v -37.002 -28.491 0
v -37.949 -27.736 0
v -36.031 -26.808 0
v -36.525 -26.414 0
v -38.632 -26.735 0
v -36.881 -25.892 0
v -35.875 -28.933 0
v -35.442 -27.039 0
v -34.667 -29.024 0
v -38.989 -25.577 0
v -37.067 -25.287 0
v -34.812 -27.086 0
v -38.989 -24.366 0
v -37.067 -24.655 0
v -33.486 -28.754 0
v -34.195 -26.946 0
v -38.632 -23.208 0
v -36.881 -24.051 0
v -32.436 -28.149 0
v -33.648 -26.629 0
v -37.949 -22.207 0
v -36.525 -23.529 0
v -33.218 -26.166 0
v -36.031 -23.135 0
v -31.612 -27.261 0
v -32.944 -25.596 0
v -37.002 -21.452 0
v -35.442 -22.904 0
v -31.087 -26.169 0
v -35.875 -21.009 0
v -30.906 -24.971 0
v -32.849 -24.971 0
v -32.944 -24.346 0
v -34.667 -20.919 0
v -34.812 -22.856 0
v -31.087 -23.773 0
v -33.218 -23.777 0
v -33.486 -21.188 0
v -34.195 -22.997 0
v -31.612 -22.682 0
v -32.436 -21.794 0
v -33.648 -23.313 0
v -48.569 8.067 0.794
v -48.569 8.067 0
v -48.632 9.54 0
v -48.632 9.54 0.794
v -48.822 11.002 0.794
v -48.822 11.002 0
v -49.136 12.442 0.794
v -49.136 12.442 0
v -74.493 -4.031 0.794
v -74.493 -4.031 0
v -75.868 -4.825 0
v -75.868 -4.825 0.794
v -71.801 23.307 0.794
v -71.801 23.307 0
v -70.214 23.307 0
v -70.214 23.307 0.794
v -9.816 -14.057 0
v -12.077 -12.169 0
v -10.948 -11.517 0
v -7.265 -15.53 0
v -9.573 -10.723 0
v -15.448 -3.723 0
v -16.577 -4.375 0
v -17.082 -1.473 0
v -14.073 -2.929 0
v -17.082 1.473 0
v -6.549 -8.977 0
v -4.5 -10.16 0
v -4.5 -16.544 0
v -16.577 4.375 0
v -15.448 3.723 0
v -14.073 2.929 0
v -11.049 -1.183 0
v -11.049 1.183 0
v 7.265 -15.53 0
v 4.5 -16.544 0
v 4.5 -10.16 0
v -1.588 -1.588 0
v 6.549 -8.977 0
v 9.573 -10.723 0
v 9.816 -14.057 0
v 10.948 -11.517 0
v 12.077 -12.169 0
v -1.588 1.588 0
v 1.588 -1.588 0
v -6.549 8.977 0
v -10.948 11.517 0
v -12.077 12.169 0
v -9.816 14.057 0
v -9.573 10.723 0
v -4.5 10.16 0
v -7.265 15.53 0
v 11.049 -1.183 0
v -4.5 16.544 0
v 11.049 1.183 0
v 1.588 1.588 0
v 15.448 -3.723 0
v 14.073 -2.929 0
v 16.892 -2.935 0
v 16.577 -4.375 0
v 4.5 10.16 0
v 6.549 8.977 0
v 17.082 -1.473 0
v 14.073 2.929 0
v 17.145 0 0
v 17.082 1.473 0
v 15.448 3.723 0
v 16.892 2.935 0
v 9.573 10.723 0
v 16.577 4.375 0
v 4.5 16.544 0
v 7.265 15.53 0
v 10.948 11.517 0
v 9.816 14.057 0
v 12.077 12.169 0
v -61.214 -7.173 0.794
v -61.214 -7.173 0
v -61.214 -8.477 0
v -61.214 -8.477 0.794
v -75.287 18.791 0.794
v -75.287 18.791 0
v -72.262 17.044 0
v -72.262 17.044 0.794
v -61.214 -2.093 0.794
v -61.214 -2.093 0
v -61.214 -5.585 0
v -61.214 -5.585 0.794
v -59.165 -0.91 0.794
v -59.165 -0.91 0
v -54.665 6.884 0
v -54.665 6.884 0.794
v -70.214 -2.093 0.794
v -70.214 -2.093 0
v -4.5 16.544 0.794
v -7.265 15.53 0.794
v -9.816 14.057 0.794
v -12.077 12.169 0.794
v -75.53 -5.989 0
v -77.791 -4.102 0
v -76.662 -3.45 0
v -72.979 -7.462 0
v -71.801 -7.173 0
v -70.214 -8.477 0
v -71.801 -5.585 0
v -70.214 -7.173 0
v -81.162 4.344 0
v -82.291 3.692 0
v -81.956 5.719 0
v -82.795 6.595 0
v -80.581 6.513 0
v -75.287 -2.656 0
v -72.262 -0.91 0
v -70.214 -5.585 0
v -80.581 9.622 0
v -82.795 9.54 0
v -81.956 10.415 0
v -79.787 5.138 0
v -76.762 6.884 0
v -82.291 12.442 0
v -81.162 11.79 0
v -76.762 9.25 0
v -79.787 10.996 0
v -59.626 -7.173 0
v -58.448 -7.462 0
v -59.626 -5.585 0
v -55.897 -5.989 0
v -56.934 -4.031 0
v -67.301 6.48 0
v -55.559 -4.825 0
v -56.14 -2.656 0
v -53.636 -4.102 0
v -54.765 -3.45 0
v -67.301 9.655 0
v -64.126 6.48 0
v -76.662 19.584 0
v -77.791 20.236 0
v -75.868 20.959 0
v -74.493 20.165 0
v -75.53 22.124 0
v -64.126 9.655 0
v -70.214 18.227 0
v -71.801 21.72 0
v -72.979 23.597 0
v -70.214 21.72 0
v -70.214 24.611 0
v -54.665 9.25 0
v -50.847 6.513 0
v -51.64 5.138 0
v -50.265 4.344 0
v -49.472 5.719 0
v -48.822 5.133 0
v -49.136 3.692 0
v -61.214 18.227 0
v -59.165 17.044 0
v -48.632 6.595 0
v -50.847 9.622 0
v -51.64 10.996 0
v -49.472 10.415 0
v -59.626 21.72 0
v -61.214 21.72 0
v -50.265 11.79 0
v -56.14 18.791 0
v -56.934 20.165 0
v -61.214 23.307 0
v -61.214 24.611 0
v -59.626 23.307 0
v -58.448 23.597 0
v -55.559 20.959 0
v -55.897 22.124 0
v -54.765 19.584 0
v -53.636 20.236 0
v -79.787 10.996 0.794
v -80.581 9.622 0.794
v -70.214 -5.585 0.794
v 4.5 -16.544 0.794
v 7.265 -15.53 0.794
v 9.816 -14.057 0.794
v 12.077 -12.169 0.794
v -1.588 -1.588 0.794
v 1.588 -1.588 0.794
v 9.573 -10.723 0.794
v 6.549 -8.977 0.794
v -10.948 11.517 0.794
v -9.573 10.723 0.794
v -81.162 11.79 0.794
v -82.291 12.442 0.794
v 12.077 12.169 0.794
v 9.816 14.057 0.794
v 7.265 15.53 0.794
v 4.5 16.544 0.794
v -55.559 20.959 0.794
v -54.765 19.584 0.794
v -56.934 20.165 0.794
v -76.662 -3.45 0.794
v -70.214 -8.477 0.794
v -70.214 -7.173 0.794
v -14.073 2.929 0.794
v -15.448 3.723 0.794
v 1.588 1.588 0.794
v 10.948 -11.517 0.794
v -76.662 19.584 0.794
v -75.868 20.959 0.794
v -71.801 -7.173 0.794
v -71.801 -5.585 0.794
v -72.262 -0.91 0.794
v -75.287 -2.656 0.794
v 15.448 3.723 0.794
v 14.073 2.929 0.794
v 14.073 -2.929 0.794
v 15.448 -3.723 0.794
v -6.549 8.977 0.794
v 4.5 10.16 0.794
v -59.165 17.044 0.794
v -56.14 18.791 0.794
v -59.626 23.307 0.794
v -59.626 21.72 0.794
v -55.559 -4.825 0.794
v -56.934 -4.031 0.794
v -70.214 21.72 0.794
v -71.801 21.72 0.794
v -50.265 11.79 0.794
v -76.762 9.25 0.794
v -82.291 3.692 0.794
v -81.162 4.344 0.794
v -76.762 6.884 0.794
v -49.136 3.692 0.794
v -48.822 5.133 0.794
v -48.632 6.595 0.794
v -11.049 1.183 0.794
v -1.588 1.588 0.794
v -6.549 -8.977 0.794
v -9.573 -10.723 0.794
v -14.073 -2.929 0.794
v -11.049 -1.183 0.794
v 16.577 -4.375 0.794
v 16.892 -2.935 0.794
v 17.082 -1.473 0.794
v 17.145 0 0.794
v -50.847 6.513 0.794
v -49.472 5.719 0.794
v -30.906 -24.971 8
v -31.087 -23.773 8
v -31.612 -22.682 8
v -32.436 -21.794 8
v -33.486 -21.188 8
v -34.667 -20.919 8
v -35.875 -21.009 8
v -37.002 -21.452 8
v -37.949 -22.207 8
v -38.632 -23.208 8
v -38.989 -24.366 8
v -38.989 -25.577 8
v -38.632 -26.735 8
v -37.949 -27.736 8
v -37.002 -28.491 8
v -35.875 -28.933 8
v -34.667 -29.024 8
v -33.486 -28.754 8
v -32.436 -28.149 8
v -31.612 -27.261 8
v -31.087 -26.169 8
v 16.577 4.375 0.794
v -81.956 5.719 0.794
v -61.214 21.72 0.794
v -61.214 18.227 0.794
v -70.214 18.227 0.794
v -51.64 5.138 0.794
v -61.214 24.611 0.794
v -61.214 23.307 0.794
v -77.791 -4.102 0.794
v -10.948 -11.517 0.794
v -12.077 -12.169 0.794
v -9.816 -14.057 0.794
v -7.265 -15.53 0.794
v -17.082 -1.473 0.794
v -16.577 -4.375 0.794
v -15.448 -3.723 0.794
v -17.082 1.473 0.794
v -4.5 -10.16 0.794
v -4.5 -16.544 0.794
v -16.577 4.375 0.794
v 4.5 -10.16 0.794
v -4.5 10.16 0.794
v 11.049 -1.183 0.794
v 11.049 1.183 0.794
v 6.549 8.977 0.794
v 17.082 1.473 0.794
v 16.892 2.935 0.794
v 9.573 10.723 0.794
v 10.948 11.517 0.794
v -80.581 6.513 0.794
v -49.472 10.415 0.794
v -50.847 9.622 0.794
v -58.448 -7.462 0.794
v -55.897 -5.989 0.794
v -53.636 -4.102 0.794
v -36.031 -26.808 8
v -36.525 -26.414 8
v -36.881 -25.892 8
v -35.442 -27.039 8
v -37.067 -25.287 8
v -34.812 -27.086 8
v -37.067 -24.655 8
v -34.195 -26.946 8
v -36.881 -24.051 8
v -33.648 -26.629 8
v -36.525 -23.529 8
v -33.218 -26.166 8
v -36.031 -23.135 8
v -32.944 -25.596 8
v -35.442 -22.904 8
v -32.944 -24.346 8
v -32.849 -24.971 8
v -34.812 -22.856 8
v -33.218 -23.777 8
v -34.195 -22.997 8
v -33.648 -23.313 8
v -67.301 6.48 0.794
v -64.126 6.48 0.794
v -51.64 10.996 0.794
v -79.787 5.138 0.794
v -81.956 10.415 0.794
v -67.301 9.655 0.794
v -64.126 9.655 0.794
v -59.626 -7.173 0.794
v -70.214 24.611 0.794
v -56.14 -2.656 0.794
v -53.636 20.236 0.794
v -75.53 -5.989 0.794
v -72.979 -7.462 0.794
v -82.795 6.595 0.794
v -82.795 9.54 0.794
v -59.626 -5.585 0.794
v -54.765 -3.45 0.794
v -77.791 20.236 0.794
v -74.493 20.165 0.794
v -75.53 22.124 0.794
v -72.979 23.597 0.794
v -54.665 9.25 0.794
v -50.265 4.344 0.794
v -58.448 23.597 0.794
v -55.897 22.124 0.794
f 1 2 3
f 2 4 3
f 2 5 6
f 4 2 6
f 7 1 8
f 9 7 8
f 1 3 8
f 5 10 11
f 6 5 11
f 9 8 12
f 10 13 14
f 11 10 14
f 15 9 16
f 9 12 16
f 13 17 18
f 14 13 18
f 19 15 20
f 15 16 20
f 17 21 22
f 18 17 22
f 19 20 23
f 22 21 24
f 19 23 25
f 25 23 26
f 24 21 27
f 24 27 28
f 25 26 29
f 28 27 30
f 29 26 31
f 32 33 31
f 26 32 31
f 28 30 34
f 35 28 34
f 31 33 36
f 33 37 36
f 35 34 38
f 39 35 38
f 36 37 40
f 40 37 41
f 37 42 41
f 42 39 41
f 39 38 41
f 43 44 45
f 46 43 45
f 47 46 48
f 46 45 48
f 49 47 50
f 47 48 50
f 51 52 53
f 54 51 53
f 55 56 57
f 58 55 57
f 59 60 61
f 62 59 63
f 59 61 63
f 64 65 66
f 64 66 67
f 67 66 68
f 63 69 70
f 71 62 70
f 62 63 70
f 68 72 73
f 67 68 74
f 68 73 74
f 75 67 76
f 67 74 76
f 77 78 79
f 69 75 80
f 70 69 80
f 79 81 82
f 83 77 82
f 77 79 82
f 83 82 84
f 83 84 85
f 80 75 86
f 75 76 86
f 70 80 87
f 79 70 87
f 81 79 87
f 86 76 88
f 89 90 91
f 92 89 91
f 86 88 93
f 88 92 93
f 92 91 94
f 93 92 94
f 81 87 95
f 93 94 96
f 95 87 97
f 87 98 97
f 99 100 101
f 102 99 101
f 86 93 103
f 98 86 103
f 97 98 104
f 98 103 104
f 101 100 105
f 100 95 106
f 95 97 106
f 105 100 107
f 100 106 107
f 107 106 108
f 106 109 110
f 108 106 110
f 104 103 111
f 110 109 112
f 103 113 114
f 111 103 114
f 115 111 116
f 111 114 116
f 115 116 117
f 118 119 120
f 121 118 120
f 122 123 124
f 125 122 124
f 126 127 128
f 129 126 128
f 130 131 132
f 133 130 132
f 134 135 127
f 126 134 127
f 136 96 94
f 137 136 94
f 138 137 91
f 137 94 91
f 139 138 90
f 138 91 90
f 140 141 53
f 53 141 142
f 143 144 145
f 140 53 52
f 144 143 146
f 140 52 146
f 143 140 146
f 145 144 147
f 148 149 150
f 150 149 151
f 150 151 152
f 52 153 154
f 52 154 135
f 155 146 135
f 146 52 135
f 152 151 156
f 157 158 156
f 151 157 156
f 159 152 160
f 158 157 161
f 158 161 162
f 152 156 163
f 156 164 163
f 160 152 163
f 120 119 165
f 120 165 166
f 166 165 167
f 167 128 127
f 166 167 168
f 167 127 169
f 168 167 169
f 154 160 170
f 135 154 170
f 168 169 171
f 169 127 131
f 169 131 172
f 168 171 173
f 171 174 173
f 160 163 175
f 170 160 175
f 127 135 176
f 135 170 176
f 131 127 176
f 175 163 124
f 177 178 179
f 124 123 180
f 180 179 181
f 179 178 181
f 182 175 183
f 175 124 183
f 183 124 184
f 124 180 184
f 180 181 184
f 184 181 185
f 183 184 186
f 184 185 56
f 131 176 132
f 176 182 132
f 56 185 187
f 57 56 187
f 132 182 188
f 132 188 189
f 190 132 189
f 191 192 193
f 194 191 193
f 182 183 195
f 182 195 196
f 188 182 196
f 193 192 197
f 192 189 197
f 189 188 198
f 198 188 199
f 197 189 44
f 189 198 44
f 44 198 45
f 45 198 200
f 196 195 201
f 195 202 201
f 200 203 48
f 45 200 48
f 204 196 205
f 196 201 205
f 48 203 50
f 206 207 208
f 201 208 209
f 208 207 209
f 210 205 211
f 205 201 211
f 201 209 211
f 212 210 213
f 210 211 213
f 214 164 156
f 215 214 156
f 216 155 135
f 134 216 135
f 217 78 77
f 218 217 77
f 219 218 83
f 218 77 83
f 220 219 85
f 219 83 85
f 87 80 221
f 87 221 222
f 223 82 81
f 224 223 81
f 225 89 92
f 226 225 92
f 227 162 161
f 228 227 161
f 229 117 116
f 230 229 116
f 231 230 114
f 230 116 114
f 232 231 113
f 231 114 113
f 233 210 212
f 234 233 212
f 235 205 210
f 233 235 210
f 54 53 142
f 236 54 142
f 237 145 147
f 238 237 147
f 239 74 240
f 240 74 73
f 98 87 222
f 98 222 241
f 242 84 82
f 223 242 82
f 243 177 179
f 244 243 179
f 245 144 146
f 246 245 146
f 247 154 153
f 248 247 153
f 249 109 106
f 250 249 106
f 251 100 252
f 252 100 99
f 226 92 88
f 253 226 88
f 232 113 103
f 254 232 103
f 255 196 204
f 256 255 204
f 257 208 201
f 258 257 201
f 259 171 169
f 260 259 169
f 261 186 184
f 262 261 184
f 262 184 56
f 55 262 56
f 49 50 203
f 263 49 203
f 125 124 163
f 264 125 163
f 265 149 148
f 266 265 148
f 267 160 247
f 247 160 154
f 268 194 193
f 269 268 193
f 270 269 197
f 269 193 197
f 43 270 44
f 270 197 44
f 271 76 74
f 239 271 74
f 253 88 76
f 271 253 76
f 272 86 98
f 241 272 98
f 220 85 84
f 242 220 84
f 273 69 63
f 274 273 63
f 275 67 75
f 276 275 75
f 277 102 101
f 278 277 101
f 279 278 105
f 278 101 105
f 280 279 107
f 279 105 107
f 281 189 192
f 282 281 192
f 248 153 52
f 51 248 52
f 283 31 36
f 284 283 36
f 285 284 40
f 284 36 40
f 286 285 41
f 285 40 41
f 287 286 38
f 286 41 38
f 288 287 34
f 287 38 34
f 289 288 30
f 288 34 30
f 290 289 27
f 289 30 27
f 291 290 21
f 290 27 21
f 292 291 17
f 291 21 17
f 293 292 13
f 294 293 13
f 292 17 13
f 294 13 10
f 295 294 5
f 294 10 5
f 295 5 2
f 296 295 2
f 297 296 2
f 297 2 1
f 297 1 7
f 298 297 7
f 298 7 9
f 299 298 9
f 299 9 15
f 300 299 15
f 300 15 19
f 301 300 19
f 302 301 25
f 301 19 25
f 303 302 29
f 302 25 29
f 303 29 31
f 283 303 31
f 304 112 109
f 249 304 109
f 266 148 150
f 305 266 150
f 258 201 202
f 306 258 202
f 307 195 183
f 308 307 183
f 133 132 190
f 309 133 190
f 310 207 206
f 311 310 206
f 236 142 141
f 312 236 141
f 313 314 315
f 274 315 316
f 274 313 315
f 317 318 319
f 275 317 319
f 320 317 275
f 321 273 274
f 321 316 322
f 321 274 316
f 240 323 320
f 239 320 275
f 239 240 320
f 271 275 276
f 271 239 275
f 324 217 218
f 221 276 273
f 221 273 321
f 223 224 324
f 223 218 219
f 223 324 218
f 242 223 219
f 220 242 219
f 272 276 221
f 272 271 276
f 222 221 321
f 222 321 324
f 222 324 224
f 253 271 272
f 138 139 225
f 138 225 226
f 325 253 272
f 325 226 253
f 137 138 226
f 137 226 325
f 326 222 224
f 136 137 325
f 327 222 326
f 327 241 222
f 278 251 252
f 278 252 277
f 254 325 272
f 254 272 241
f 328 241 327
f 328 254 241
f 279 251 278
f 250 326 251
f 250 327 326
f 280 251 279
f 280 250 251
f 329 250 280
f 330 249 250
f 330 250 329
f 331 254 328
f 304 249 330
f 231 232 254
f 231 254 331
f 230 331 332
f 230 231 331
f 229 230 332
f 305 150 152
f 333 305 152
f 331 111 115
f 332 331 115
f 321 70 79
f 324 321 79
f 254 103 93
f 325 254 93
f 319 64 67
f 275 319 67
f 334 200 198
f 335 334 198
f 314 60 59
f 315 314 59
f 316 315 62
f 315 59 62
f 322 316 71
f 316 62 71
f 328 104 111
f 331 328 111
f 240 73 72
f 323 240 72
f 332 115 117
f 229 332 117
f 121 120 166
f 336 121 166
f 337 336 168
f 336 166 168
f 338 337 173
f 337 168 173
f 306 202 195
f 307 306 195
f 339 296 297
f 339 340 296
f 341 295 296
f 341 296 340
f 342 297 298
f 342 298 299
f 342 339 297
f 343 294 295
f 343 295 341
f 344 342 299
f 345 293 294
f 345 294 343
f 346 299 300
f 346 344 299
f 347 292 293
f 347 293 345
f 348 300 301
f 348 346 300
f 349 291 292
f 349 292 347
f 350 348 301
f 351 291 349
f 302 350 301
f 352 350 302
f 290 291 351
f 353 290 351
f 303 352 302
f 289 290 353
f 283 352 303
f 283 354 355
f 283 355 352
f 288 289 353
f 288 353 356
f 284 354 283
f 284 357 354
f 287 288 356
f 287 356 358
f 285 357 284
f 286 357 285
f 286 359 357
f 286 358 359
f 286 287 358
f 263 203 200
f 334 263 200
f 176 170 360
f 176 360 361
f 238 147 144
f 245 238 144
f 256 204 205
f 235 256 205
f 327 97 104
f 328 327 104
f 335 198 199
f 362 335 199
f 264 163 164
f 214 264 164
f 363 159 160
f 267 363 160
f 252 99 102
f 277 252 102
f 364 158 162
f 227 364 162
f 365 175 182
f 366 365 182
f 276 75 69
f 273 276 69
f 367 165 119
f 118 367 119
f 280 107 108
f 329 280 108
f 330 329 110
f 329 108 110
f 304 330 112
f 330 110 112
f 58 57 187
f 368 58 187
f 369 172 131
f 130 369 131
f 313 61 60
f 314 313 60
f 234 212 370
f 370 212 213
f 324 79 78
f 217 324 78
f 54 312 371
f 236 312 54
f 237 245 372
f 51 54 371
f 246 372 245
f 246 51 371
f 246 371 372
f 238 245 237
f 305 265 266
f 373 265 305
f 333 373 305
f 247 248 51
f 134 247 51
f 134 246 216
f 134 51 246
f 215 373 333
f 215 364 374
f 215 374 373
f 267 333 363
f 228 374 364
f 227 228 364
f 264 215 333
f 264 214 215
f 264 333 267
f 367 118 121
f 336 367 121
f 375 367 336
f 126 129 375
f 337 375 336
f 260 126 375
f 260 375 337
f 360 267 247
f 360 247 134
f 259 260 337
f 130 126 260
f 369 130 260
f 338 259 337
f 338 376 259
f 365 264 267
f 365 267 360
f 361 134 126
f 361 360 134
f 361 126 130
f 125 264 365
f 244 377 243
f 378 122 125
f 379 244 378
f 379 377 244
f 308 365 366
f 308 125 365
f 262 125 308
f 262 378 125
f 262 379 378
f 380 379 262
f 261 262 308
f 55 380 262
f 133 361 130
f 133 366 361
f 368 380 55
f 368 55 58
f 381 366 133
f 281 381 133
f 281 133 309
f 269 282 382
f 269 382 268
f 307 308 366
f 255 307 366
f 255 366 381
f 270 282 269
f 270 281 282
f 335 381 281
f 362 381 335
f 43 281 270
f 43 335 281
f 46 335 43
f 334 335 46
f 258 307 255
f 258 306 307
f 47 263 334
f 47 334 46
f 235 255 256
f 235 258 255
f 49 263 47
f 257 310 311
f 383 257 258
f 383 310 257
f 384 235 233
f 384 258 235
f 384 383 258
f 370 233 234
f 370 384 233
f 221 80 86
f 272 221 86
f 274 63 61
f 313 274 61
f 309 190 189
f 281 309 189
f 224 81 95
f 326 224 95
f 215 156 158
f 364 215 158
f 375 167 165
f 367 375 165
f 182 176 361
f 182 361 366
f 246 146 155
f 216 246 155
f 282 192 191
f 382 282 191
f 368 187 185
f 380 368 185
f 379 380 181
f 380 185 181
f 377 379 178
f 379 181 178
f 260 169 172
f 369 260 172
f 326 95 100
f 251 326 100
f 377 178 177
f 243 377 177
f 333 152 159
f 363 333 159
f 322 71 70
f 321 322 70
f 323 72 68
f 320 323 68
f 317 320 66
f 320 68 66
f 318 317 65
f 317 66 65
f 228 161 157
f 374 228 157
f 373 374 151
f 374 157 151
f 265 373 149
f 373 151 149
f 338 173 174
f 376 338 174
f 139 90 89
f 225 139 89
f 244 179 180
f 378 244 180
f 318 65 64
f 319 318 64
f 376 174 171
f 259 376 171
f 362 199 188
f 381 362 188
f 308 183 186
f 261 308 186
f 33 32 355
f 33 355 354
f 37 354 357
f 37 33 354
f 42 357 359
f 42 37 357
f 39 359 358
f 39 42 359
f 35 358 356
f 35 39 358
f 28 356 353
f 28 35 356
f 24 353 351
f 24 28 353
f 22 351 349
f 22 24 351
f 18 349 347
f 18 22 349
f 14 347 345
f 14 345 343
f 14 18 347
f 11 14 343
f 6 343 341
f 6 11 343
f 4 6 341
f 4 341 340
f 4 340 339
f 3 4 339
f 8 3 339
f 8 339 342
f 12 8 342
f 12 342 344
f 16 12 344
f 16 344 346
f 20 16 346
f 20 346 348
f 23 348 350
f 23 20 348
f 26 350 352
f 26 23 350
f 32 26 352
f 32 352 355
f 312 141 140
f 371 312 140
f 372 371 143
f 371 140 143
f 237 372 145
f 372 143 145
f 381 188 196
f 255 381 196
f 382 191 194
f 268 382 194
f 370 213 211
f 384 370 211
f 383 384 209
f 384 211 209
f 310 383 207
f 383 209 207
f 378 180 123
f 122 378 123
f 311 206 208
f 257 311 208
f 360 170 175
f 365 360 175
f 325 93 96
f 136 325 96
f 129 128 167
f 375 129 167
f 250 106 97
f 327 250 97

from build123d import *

# Parameters (mm, degrees)
F0_R     = 4.064
F0_R_2   = 2.1209
F1_DEPTH = 8
F0_W     = 1.5875
F0_H     = 1.5875
F0_W_2   = 3.175
F0_H_2   = 3.175
F2_DEPTH = 0.79375
F3_DEPTH = 0.79375


with BuildPart() as f1:
    # F0 (on Top) → F1 (new body)
    with BuildSketch(Plane.XY):
        with Locations((-34.970284, -24.971306)):
            Circle(F0_R)
        with Locations((-34.970284, -24.971306)):
            Circle(F0_R_2, mode=Mode.SUBTRACT)
    extrude(amount=F1_DEPTH)


with BuildPart() as f2:
    # F0 (on Top) → F2 (new body)
    with BuildSketch(Plane.XY):
        Polygon((-16.241977, -2.34807), (-15.448227, -3.722886), (-14.073412, -2.929136), (-14.867162, -1.55432), align=None)
        with Locations((-5.29375, -14.44625)):
            Rectangle(F0_W, F0_H)
        with Locations((5.29375, -14.44625)):
            Rectangle(F0_W, F0_H)
        Polygon((10.154477, -12.89193), (10.948227, -11.517114), (9.573412, -10.723364), (8.779662, -12.09818), align=None)
        Polygon((14.073412, -2.929136), (15.448227, -3.722886), (16.241977, -2.34807), (14.867162, -1.55432), align=None)
        Polygon((16.241977, 2.34807), (15.448227, 3.722886), (14.073412, 2.929136), (14.867162, 1.55432), align=None)
        Polygon((-10.154477, 12.89193), (-10.948227, 11.517114), (-9.573412, 10.723364), (-8.779662, 12.09818), align=None)
        with BuildLine():
            ThreePointArc((16.577448, -4.374842), (17.00252, -2.205751), (17.145, 0))
            ThreePointArc((17.145, 0), (17.00252, 2.205751), (16.577448, 4.374842))
            Line((16.577448, 4.374842), (15.448227, 3.722886))
            Line((15.448227, 3.722886), (16.241977, 2.34807))
            Line((16.241977, 2.34807), (14.867162, 1.55432))
            Line((14.867162, 1.55432), (14.073412, 2.929136))
            Line((14.073412, 2.929136), (11.048818, 1.182886))
            Line((11.048818, 1.182886), (6.548818, 8.977114))
            Line((6.548818, 8.977114), (9.573412, 10.723364))
            Line((9.573412, 10.723364), (8.779662, 12.09818))
            Line((8.779662, 12.09818), (10.154477, 12.89193))
            Line((10.154477, 12.89193), (10.948227, 11.517114))
            Line((10.948227, 11.517114), (12.077448, 12.16907))
            ThreePointArc((12.077448, 12.16907), (8.5725, 14.848006), (4.5, 16.543912))
            Line((4.5, 16.543912), (4.5, 15.24))
            Line((4.5, 15.24), (6.0875, 15.24))
            Line((6.0875, 15.24), (6.0875, 13.6525))
            Line((6.0875, 13.6525), (4.5, 13.6525))
            Line((4.5, 13.6525), (4.5, 10.16))
            Line((4.5, 10.16), (-4.5, 10.16))
            Line((-4.5, 10.16), (-4.5, 13.6525))
            Line((-4.5, 13.6525), (-6.0875, 13.6525))
            Line((-6.0875, 13.6525), (-6.0875, 15.24))
            Line((-6.0875, 15.24), (-4.5, 15.24))
            Line((-4.5, 15.24), (-4.5, 16.543912))
            ThreePointArc((-4.5, 16.543912), (-8.5725, 14.848006), (-12.077448, 12.16907))
            Line((-12.077448, 12.16907), (-10.948227, 11.517114))
            Line((-10.948227, 11.517114), (-10.154477, 12.89193))
            Line((-10.154477, 12.89193), (-8.779662, 12.09818))
            Line((-8.779662, 12.09818), (-9.573412, 10.723364))
            Line((-9.573412, 10.723364), (-6.548818, 8.977114))
            Line((-6.548818, 8.977114), (-11.048818, 1.182886))
            Line((-11.048818, 1.182886), (-14.073412, 2.929136))
            Line((-14.073412, 2.929136), (-14.867162, 1.55432))
            Line((-14.867162, 1.55432), (-16.241977, 2.34807))
            Line((-16.241977, 2.34807), (-15.448227, 3.722886))
            Line((-15.448227, 3.722886), (-16.577448, 4.374842))
            ThreePointArc((-16.577448, 4.374842), (-17.145, 0), (-16.577448, -4.374842))
            Line((-16.577448, -4.374842), (-15.448227, -3.722886))
            Line((-15.448227, -3.722886), (-16.241977, -2.34807))
            Line((-16.241977, -2.34807), (-14.867162, -1.55432))
            Line((-14.867162, -1.55432), (-14.073412, -2.929136))
            Line((-14.073412, -2.929136), (-11.048818, -1.182886))
            Line((-11.048818, -1.182886), (-6.548818, -8.977114))
            Line((-6.548818, -8.977114), (-9.573412, -10.723364))
            Line((-9.573412, -10.723364), (-8.779662, -12.09818))
            Line((-8.779662, -12.09818), (-10.154477, -12.89193))
            Line((-10.154477, -12.89193), (-10.948227, -11.517114))
            Line((-10.948227, -11.517114), (-12.077448, -12.16907))
            ThreePointArc((-12.077448, -12.16907), (-8.5725, -14.848006), (-4.5, -16.543912))
            Line((-4.5, -16.543912), (-4.5, -15.24))
            Line((-4.5, -15.24), (-6.0875, -15.24))
            Line((-6.0875, -15.24), (-6.0875, -13.6525))
            Line((-6.0875, -13.6525), (-4.5, -13.6525))
            Line((-4.5, -13.6525), (-4.5, -10.16))
            Line((-4.5, -10.16), (4.5, -10.16))
            Line((4.5, -10.16), (4.5, -13.6525))
            Line((4.5, -13.6525), (6.0875, -13.6525))
            Line((6.0875, -13.6525), (6.0875, -15.24))
            Line((6.0875, -15.24), (4.5, -15.24))
            Line((4.5, -15.24), (4.5, -16.543912))
            ThreePointArc((4.5, -16.543912), (8.5725, -14.848006), (12.077448, -12.16907))
            Line((12.077448, -12.16907), (10.948227, -11.517114))
            Line((10.948227, -11.517114), (10.154477, -12.89193))
            Line((10.154477, -12.89193), (8.779662, -12.09818))
            Line((8.779662, -12.09818), (9.573412, -10.723364))
            Line((9.573412, -10.723364), (6.548818, -8.977114))
            Line((6.548818, -8.977114), (11.048818, -1.182886))
            Line((11.048818, -1.182886), (14.073412, -2.929136))
            Line((14.073412, -2.929136), (14.867162, -1.55432))
            Line((14.867162, -1.55432), (16.241977, -2.34807))
            Line((16.241977, -2.34807), (15.448227, -3.722886))
            Line((15.448227, -3.722886), (16.577448, -4.374842))
        make_face()
        Rectangle(F0_W_2, F0_H_2, mode=Mode.SUBTRACT)
        with Locations((-5.29375, 14.44625)):
            Rectangle(F0_W, F0_H)
        with Locations((5.29375, 14.44625)):
            Rectangle(F0_W, F0_H)
        Polygon((9.573412, 10.723364), (10.948227, 11.517114), (10.154477, 12.89193), (8.779662, 12.09818), align=None)
        Polygon((-14.073412, 2.929136), (-15.448227, 3.722886), (-16.241977, 2.34807), (-14.867162, 1.55432), align=None)
        Polygon((-9.573412, -10.723364), (-10.948227, -11.517114), (-10.154477, -12.89193), (-8.779662, -12.09818), align=None)
    extrude(amount=F2_DEPTH)


with BuildPart() as f3:
    # F0 (on Top) → F3 (new body)
    with BuildSketch(Plane.XY):
        with BuildLine():
            ThreePointArc((-49.136233, 3.692473), (-48.711161, 5.861563), (-48.568681, 8.067314))
            ThreePointArc((-48.568681, 8.067314), (-48.711161, 10.273066), (-49.136233, 12.442156))
            Line((-49.136233, 12.442156), (-50.265454, 11.7902))
            Line((-50.265454, 11.7902), (-49.471704, 10.415385))
            Line((-49.471704, 10.415385), (-50.846519, 9.621635))
            Line((-50.846519, 9.621635), (-51.640269, 10.99645))
            Line((-51.640269, 10.99645), (-54.664863, 9.2502))
            Line((-54.664863, 9.2502), (-59.164863, 17.044429))
            Line((-59.164863, 17.044429), (-56.140269, 18.790679))
            Line((-56.140269, 18.790679), (-56.934019, 20.165494))
            Line((-56.934019, 20.165494), (-55.559204, 20.959244))
            Line((-55.559204, 20.959244), (-54.765454, 19.584429))
            Line((-54.765454, 19.584429), (-53.636233, 20.236385))
            ThreePointArc((-53.636233, 20.236385), (-57.141181, 22.91532), (-61.213681, 24.611226))
            Line((-61.213681, 24.611226), (-61.213681, 23.307314))
            Line((-61.213681, 23.307314), (-59.626181, 23.307314))
            Line((-59.626181, 23.307314), (-59.626181, 21.719814))
            Line((-59.626181, 21.719814), (-61.213681, 21.719814))
            Line((-61.213681, 21.719814), (-61.213681, 18.227314))
            Line((-61.213681, 18.227314), (-70.213681, 18.227314))
            Line((-70.213681, 18.227314), (-70.213681, 21.719814))
            Line((-70.213681, 21.719814), (-71.801181, 21.719814))
            Line((-71.801181, 21.719814), (-71.801181, 23.307314))
            Line((-71.801181, 23.307314), (-70.213681, 23.307314))
            Line((-70.213681, 23.307314), (-70.213681, 24.611226))
            ThreePointArc((-70.213681, 24.611226), (-74.286181, 22.91532), (-77.791129, 20.236385))
            Line((-77.791129, 20.236385), (-76.661908, 19.584429))
            Line((-76.661908, 19.584429), (-75.868158, 20.959244))
            Line((-75.868158, 20.959244), (-74.493343, 20.165494))
            Line((-74.493343, 20.165494), (-75.287093, 18.790679))
            Line((-75.287093, 18.790679), (-72.262499, 17.044429))
            Line((-72.262499, 17.044429), (-76.762499, 9.2502))
            Line((-76.762499, 9.2502), (-79.787093, 10.99645))
            Line((-79.787093, 10.99645), (-80.580843, 9.621635))
            Line((-80.580843, 9.621635), (-81.955658, 10.415385))
            Line((-81.955658, 10.415385), (-81.161908, 11.7902))
            Line((-81.161908, 11.7902), (-82.291129, 12.442156))
            ThreePointArc((-82.291129, 12.442156), (-82.858681, 8.067314), (-82.291129, 3.692473))
            Line((-82.291129, 3.692473), (-81.161908, 4.344429))
            Line((-81.161908, 4.344429), (-81.955658, 5.719244))
            Line((-81.955658, 5.719244), (-80.580843, 6.512994))
            Line((-80.580843, 6.512994), (-79.787093, 5.138179))
            Line((-79.787093, 5.138179), (-76.762499, 6.884429))
            Line((-76.762499, 6.884429), (-72.262499, -0.9098))
            Line((-72.262499, -0.9098), (-75.287093, -2.65605))
            Line((-75.287093, -2.65605), (-74.493343, -4.030865))
            Line((-74.493343, -4.030865), (-75.868158, -4.824615))
            Line((-75.868158, -4.824615), (-76.661908, -3.4498))
            Line((-76.661908, -3.4498), (-77.791129, -4.101756))
            ThreePointArc((-77.791129, -4.101756), (-74.286181, -6.780691), (-70.213681, -8.476598))
            Line((-70.213681, -8.476598), (-70.213681, -7.172686))
            Line((-70.213681, -7.172686), (-71.801181, -7.172686))
            Line((-71.801181, -7.172686), (-71.801181, -5.585186))
            Line((-71.801181, -5.585186), (-70.213681, -5.585186))
            Line((-70.213681, -5.585186), (-70.213681, -2.092686))
            Line((-70.213681, -2.092686), (-61.213681, -2.092686))
            Line((-61.213681, -2.092686), (-61.213681, -5.585186))
            Line((-61.213681, -5.585186), (-59.626181, -5.585186))
            Line((-59.626181, -5.585186), (-59.626181, -7.172686))
            Line((-59.626181, -7.172686), (-61.213681, -7.172686))
            Line((-61.213681, -7.172686), (-61.213681, -8.476598))
            ThreePointArc((-61.213681, -8.476598), (-57.141181, -6.780691), (-53.636233, -4.101756))
            Line((-53.636233, -4.101756), (-54.765454, -3.4498))
            Line((-54.765454, -3.4498), (-55.559204, -4.824615))
            Line((-55.559204, -4.824615), (-56.934019, -4.030865))
            Line((-56.934019, -4.030865), (-56.140269, -2.65605))
            Line((-56.140269, -2.65605), (-59.164863, -0.9098))
            Line((-59.164863, -0.9098), (-54.664863, 6.884429))
            Line((-54.664863, 6.884429), (-51.640269, 5.138179))
            Line((-51.640269, 5.138179), (-50.846519, 6.512994))
            Line((-50.846519, 6.512994), (-49.471704, 5.719244))
            Line((-49.471704, 5.719244), (-50.265454, 4.344429))
            Line((-50.265454, 4.344429), (-49.136233, 3.692473))
        make_face()
        with Locations((-65.713681, 8.067314)):
            Rectangle(F0_W_2, F0_H_2, mode=Mode.SUBTRACT)
    extrude(amount=F3_DEPTH)


solid = Compound([f1.part, f2.part, f3.part])
